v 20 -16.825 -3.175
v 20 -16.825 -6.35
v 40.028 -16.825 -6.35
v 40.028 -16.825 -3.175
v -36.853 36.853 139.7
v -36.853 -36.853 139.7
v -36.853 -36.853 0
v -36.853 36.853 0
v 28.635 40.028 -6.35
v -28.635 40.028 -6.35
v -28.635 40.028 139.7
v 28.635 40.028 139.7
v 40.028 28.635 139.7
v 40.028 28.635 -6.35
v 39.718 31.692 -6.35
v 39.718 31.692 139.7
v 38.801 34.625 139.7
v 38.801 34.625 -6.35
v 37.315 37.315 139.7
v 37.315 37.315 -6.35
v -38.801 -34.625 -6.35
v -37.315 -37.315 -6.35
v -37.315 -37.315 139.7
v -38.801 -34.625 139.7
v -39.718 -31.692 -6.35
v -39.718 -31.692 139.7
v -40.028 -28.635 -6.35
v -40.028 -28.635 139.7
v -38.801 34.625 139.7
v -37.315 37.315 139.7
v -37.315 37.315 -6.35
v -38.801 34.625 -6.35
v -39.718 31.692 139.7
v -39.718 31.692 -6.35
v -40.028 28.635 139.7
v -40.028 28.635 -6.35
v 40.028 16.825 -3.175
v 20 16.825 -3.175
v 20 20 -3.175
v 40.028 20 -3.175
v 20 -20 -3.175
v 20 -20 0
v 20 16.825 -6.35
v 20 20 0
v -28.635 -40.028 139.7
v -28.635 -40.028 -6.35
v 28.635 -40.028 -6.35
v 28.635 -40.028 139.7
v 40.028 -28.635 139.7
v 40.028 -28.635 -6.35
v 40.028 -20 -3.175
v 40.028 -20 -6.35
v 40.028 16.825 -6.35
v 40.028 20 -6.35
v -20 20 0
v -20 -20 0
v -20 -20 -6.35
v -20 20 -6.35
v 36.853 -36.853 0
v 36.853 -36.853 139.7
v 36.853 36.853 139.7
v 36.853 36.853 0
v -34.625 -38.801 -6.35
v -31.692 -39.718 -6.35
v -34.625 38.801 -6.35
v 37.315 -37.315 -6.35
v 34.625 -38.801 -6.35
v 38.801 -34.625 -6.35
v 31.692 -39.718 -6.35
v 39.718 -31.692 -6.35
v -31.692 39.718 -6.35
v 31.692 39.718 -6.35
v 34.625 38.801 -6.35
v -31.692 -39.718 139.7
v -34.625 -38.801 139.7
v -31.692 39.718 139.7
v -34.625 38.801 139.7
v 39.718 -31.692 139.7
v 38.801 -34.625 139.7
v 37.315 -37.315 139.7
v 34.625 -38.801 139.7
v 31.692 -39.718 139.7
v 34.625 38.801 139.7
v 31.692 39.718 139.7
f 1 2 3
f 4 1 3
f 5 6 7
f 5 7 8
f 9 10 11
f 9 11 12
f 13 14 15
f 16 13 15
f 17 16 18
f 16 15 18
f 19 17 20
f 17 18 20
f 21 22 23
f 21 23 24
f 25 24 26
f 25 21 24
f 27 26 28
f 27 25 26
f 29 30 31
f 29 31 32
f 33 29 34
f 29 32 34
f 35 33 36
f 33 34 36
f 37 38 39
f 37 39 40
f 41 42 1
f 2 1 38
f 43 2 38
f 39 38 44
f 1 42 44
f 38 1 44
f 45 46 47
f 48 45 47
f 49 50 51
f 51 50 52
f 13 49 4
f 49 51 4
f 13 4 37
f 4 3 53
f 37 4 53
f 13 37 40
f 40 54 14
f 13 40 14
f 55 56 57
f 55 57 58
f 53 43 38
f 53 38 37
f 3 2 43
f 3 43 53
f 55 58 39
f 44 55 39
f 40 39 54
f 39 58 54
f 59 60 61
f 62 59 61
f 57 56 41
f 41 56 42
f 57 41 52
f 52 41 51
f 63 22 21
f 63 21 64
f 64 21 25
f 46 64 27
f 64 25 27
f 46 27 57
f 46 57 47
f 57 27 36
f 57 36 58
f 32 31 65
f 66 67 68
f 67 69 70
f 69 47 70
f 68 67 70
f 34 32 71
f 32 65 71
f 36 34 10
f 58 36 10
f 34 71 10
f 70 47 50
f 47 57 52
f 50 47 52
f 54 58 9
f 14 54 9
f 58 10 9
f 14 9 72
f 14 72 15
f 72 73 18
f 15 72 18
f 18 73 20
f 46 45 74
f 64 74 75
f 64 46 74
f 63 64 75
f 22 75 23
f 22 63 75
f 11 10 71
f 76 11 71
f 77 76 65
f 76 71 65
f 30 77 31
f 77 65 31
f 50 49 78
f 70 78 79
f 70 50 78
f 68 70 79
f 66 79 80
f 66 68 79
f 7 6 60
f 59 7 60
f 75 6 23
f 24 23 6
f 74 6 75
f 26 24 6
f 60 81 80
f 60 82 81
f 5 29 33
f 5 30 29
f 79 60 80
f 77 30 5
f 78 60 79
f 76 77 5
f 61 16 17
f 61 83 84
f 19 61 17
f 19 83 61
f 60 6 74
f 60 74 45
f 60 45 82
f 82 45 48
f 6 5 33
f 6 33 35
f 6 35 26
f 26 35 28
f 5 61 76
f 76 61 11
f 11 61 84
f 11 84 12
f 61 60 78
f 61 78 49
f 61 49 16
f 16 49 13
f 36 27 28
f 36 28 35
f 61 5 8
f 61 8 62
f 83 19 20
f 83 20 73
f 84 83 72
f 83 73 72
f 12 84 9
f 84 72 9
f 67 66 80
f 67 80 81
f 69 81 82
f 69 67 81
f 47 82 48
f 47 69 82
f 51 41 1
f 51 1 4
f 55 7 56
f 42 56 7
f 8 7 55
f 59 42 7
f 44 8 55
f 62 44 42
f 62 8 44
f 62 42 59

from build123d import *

# Parameters (mm, degrees)
F0_W        = 80.0557104707
F0_H        = 80.0557104707
F0_W_2      = 73.7057104707
F0_H_2      = 73.7057104707
F0_W_3      = 39.99992
F0_H_3      = 39.99992
F1_DEPTH    = 6.35
F2_DEPTH    = 9.144
F3_DEPTH    = 139.7
F4_W        = 20.0278952353
F4_H        = 3.175
F5_DEPTH    = 3.175
F7_SIZE     = 5.08
F6_T1_DEPTH = 177.6130734528


# Not quite as in the source:
# - a fillet or chamfer that OpenCascade refuses, or shapes differently, is made with other operations: its cross-section is extruded or revolved along the edge and cut away or added


with BuildPart() as f1:
    # F0 (on Top) → F1 (new body)
    with BuildSketch(Plane.XY):
        Rectangle(F0_W, F0_H)
        Rectangle(F0_W_2, F0_H_2, mode=Mode.SUBTRACT)
        Rectangle(F0_W_2, F0_H_2)
        Rectangle(F0_W_3, F0_H_3, mode=Mode.SUBTRACT)
        Rectangle(F0_W_3, F0_H_3)
    extrude(amount=-F1_DEPTH)

    # F0 (on Top) → F2 (cut)
    with BuildSketch(Plane.XY):
        Rectangle(F0_W_3, F0_H_3)
    extrude(amount=-F2_DEPTH, mode=Mode.SUBTRACT)

    # F0 (on Top) → F3 (join)
    with BuildSketch(Plane.XY):
        Rectangle(F0_W, F0_H)
        Rectangle(F0_W_2, F0_H_2, mode=Mode.SUBTRACT)
    extrude(amount=F3_DEPTH)

    # F4 (on face) → F5 (cut)
    with BuildSketch(Plane(origin=(0, 0, -6.35), x_dir=(1, 0, 0), z_dir=(0, 0, -1))):
        with Locations((30.0139076177, 18.41246)):
            Rectangle(F4_W, F4_H)
        with Locations((30.0139076177, -18.41246)):
            Rectangle(F4_W, F4_H)
    extrude(amount=-F5_DEPTH, mode=Mode.SUBTRACT)

    # F7
    f7_edges = [f1.edges().sort_by_distance(p)[0] for p in [
        (40.027855, -40.027855, 66.675),
        (-40.027855, -40.027855, 66.675),
        (-40.027855, 40.027855, 66.675),
        (40.027855, 40.027855, 66.675),
    ]]
    chamfer(f7_edges, length=F7_SIZE)

    # F6: fillet of radius 15.24 on 8 edges, made by hand

    # F6_s2 → F6_t1 (cut)
    with BuildSketch(Plane.XY.offset(-22.1315367264)):
        with BuildLine():
            ThreePointArc((-28.6352405448, -40.0278552353), (-34.467336054, -38.8677793108), (-39.4115478901, -35.5641625806))
            Line((-39.4115478901, -35.5641625806), (-34.9478552353, -40.0278552353))
            Line((-34.9478552353, -40.0278552353), (-28.6352405448, -40.0278552353))
        make_face()
        with BuildLine():
            ThreePointArc((-35.5641625806, -39.4115478901), (-38.8677793108, -34.467336054), (-40.0278552353, -28.6352405448))
            Line((-40.0278552353, -28.6352405448), (-40.0278552353, -34.9478552353))
            Line((-40.0278552353, -34.9478552353), (-35.5641625806, -39.4115478901))
        make_face()
        with BuildLine():
            ThreePointArc((-35.5641625806, 39.4115478901), (-38.8677793108, 34.467336054), (-40.0278552353, 28.6352405448))
            Line((-40.0278552353, 28.6352405448), (-40.0278552353, 34.9478552353))
            Line((-40.0278552353, 34.9478552353), (-35.5641625806, 39.4115478901))
        make_face()
        with BuildLine():
            ThreePointArc((-28.6352405448, 40.0278552353), (-34.467336054, 38.8677793108), (-39.4115478901, 35.5641625806))
            Line((-39.4115478901, 35.5641625806), (-34.9478552353, 40.0278552353))
            Line((-34.9478552353, 40.0278552353), (-28.6352405448, 40.0278552353))
        make_face()
        with BuildLine():
            ThreePointArc((40.0278552353, -28.6352405448), (38.8677793108, -34.467336054), (35.5641625806, -39.4115478901))
            Line((35.5641625806, -39.4115478901), (40.0278552353, -34.9478552353))
            Line((40.0278552353, -34.9478552353), (40.0278552353, -28.6352405448))
        make_face()
        with BuildLine():
            ThreePointArc((39.4115478901, -35.5641625806), (34.467336054, -38.8677793108), (28.6352405448, -40.0278552353))
            Line((28.6352405448, -40.0278552353), (34.9478552353, -40.0278552353))
            Line((34.9478552353, -40.0278552353), (39.4115478901, -35.5641625806))
        make_face()
        with BuildLine():
            ThreePointArc((40.0278552353, 28.6352405448), (38.8677793108, 34.467336054), (35.5641625806, 39.4115478901))
            Line((35.5641625806, 39.4115478901), (40.0278552353, 34.9478552353))
            Line((40.0278552353, 34.9478552353), (40.0278552353, 28.6352405448))
        make_face()
        with BuildLine():
            ThreePointArc((39.4115478901, 35.5641625806), (34.467336054, 38.8677793108), (28.6352405448, 40.0278552353))
            Line((28.6352405448, 40.0278552353), (34.9478552353, 40.0278552353))
            Line((34.9478552353, 40.0278552353), (39.4115478901, 35.5641625806))
        make_face()
    extrude(amount=F6_T1_DEPTH, mode=Mode.SUBTRACT)


solid = f1.part
